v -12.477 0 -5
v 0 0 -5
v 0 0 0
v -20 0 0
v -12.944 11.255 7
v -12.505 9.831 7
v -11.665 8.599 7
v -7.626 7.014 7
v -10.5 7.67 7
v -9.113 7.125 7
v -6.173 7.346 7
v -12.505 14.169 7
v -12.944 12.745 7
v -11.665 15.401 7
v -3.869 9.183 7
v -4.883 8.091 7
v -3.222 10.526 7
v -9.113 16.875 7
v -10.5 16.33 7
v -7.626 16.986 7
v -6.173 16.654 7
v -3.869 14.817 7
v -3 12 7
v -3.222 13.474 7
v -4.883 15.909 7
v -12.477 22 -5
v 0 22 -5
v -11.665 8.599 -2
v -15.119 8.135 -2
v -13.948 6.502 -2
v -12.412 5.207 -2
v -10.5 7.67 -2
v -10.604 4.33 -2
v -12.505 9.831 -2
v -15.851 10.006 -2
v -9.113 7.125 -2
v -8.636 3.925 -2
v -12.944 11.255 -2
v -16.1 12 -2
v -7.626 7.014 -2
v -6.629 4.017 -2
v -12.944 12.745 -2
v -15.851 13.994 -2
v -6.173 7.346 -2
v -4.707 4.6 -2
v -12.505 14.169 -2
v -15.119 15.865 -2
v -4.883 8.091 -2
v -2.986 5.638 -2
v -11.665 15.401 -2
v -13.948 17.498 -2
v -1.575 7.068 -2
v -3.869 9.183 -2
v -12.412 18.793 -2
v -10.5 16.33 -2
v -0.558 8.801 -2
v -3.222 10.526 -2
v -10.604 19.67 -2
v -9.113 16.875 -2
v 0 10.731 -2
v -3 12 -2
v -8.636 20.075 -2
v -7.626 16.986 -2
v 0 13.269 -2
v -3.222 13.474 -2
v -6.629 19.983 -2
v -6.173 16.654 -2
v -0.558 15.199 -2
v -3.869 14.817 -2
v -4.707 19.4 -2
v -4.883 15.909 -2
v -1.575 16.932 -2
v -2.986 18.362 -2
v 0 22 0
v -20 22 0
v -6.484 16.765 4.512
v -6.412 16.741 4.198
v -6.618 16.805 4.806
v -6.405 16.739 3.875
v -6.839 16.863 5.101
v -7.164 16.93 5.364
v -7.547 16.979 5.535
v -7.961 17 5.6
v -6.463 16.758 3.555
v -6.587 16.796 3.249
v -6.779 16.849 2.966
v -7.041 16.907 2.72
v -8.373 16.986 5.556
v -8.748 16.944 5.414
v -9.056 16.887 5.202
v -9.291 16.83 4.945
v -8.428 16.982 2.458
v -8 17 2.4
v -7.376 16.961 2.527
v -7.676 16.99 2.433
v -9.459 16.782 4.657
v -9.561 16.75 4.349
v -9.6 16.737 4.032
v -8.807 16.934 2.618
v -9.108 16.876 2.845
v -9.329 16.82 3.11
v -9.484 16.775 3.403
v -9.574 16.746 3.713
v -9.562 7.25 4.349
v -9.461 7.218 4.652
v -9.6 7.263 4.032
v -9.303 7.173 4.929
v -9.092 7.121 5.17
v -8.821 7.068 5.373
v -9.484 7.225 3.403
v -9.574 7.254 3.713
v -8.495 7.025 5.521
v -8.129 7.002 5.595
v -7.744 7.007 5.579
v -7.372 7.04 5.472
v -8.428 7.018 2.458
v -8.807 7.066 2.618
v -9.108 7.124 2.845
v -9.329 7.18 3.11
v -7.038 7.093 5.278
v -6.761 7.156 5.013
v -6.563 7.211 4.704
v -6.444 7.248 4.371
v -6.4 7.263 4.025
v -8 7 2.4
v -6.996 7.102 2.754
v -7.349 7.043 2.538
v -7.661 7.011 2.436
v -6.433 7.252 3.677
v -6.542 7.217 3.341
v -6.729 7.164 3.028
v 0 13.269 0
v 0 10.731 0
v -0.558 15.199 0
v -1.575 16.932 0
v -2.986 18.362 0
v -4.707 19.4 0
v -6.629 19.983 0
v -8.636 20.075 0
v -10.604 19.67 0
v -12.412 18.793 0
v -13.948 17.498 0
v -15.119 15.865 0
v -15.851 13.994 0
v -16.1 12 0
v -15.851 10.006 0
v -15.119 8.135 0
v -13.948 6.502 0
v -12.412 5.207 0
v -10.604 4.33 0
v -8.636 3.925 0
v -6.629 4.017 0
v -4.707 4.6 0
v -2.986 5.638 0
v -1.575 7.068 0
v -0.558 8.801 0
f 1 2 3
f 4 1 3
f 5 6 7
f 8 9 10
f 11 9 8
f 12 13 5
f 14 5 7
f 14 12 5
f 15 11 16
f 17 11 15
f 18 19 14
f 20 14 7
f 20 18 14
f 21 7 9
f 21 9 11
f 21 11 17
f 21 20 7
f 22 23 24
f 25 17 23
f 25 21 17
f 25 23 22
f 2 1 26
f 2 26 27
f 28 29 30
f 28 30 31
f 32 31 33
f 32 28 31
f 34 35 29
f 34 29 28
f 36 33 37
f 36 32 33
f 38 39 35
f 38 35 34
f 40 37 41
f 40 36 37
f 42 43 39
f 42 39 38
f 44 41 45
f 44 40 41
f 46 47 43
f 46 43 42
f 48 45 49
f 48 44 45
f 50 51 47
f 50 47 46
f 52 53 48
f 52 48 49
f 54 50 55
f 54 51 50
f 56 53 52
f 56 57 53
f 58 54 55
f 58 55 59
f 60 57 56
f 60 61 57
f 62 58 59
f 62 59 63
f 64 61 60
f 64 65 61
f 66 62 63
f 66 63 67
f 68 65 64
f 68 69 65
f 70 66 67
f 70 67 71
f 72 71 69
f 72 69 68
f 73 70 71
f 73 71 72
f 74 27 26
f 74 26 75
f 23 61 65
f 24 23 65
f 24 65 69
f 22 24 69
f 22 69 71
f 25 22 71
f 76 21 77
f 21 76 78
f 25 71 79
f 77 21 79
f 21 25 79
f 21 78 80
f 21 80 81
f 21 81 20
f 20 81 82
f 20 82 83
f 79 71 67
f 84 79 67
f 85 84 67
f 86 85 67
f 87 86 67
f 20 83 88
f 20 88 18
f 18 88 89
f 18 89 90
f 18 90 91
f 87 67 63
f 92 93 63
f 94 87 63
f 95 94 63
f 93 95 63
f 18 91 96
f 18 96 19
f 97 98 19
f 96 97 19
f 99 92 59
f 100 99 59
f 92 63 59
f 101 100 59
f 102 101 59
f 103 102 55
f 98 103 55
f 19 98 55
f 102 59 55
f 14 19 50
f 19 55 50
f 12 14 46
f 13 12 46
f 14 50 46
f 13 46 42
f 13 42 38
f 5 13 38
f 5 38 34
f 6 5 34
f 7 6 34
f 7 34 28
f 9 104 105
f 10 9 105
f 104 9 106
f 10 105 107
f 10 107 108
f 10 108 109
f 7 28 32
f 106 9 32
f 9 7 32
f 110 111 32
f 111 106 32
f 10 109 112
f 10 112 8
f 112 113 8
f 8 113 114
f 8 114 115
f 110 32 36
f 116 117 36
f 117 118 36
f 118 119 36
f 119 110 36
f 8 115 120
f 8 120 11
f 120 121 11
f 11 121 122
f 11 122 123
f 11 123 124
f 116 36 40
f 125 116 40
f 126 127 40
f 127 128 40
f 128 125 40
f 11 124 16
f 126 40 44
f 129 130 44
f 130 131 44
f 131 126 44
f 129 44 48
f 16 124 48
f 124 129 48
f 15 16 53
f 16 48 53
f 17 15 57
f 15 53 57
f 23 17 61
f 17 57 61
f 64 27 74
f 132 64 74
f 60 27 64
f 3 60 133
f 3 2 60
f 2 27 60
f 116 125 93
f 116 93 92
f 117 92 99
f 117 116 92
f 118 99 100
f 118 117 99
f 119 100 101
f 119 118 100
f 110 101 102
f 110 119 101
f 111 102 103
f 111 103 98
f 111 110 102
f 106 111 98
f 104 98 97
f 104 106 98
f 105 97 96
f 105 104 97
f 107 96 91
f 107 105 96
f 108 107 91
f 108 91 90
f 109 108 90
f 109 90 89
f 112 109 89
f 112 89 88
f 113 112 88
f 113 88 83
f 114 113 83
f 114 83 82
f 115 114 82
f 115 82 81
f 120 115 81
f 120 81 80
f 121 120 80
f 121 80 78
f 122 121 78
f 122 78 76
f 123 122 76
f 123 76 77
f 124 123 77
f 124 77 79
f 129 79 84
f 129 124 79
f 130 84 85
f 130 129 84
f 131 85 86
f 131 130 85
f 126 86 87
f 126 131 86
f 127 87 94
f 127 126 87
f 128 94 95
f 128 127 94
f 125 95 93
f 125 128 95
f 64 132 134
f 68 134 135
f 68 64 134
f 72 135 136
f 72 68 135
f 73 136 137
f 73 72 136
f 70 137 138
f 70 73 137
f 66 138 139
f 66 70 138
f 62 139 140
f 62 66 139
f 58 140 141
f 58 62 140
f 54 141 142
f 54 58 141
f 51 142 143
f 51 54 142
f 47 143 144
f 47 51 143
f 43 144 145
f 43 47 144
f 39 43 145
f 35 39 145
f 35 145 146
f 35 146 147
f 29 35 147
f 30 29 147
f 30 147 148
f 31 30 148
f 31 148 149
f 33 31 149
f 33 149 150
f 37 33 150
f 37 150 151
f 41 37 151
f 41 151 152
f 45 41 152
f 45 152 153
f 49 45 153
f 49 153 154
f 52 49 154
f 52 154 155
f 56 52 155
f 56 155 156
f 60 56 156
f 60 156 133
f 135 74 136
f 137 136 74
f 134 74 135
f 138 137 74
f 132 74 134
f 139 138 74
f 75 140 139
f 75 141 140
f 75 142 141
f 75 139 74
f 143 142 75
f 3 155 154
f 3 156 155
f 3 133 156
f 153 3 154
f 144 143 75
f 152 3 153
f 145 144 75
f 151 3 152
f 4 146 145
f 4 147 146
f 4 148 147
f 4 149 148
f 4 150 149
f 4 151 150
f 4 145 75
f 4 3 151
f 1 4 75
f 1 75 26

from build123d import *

# Parameters (mm, degrees)
EXTRUDE_1_DEPTH     = 22
SKETCH_2_R          = 5
EXTRUDE_2_DEPTH     = 7
CUT_EXTRUDE_START   = -2
SKETCH_3_R          = 8.1
SKETCH_3_R_2        = 5
CUT_EXTRUDE_1_DEPTH = 2
SKETCH_4_R          = 1.6
CUT_EXTRUDE_2_DEPTH = 31.545048699


with BuildPart() as part:
    # 草图1 → 凸台-拉伸1 (new body)
    with BuildSketch(Plane(origin=(0, 0, 0), x_dir=(1, 0, 0), z_dir=(0, 1, 0))):
        Polygon((0, 0), (-20, 0), (-12.477453102, 5), (0, 5), align=None)
    extrude(amount=EXTRUDE_1_DEPTH)

    # 草图2 → 凸台-拉伸2 (add)
    with BuildSketch(Plane.XY):
        with Locations((-8, 12)):
            Circle(SKETCH_2_R)
    extrude(amount=EXTRUDE_2_DEPTH)

    # 草图3 → 切除-拉伸1 (cut)
    with BuildSketch(Plane.XY.offset(CUT_EXTRUDE_START)):
        with Locations((-8, 12)):
            Circle(SKETCH_3_R)
        with Locations((-8, 12)):
            Circle(SKETCH_3_R_2, mode=Mode.SUBTRACT)
    extrude(amount=CUT_EXTRUDE_1_DEPTH, mode=Mode.SUBTRACT)

    # 草图4 → 切除-拉伸2 (cut, through all)
    with BuildSketch(Plane(origin=(0, 0, 0), x_dir=(1, 0, 0), z_dir=(0, 1, 0))):
        with Locations(Location((-8, -4, 0), (0, 0, 90))):
            Circle(SKETCH_4_R)
    extrude(amount=CUT_EXTRUDE_2_DEPTH, mode=Mode.SUBTRACT)


solid = part.part
